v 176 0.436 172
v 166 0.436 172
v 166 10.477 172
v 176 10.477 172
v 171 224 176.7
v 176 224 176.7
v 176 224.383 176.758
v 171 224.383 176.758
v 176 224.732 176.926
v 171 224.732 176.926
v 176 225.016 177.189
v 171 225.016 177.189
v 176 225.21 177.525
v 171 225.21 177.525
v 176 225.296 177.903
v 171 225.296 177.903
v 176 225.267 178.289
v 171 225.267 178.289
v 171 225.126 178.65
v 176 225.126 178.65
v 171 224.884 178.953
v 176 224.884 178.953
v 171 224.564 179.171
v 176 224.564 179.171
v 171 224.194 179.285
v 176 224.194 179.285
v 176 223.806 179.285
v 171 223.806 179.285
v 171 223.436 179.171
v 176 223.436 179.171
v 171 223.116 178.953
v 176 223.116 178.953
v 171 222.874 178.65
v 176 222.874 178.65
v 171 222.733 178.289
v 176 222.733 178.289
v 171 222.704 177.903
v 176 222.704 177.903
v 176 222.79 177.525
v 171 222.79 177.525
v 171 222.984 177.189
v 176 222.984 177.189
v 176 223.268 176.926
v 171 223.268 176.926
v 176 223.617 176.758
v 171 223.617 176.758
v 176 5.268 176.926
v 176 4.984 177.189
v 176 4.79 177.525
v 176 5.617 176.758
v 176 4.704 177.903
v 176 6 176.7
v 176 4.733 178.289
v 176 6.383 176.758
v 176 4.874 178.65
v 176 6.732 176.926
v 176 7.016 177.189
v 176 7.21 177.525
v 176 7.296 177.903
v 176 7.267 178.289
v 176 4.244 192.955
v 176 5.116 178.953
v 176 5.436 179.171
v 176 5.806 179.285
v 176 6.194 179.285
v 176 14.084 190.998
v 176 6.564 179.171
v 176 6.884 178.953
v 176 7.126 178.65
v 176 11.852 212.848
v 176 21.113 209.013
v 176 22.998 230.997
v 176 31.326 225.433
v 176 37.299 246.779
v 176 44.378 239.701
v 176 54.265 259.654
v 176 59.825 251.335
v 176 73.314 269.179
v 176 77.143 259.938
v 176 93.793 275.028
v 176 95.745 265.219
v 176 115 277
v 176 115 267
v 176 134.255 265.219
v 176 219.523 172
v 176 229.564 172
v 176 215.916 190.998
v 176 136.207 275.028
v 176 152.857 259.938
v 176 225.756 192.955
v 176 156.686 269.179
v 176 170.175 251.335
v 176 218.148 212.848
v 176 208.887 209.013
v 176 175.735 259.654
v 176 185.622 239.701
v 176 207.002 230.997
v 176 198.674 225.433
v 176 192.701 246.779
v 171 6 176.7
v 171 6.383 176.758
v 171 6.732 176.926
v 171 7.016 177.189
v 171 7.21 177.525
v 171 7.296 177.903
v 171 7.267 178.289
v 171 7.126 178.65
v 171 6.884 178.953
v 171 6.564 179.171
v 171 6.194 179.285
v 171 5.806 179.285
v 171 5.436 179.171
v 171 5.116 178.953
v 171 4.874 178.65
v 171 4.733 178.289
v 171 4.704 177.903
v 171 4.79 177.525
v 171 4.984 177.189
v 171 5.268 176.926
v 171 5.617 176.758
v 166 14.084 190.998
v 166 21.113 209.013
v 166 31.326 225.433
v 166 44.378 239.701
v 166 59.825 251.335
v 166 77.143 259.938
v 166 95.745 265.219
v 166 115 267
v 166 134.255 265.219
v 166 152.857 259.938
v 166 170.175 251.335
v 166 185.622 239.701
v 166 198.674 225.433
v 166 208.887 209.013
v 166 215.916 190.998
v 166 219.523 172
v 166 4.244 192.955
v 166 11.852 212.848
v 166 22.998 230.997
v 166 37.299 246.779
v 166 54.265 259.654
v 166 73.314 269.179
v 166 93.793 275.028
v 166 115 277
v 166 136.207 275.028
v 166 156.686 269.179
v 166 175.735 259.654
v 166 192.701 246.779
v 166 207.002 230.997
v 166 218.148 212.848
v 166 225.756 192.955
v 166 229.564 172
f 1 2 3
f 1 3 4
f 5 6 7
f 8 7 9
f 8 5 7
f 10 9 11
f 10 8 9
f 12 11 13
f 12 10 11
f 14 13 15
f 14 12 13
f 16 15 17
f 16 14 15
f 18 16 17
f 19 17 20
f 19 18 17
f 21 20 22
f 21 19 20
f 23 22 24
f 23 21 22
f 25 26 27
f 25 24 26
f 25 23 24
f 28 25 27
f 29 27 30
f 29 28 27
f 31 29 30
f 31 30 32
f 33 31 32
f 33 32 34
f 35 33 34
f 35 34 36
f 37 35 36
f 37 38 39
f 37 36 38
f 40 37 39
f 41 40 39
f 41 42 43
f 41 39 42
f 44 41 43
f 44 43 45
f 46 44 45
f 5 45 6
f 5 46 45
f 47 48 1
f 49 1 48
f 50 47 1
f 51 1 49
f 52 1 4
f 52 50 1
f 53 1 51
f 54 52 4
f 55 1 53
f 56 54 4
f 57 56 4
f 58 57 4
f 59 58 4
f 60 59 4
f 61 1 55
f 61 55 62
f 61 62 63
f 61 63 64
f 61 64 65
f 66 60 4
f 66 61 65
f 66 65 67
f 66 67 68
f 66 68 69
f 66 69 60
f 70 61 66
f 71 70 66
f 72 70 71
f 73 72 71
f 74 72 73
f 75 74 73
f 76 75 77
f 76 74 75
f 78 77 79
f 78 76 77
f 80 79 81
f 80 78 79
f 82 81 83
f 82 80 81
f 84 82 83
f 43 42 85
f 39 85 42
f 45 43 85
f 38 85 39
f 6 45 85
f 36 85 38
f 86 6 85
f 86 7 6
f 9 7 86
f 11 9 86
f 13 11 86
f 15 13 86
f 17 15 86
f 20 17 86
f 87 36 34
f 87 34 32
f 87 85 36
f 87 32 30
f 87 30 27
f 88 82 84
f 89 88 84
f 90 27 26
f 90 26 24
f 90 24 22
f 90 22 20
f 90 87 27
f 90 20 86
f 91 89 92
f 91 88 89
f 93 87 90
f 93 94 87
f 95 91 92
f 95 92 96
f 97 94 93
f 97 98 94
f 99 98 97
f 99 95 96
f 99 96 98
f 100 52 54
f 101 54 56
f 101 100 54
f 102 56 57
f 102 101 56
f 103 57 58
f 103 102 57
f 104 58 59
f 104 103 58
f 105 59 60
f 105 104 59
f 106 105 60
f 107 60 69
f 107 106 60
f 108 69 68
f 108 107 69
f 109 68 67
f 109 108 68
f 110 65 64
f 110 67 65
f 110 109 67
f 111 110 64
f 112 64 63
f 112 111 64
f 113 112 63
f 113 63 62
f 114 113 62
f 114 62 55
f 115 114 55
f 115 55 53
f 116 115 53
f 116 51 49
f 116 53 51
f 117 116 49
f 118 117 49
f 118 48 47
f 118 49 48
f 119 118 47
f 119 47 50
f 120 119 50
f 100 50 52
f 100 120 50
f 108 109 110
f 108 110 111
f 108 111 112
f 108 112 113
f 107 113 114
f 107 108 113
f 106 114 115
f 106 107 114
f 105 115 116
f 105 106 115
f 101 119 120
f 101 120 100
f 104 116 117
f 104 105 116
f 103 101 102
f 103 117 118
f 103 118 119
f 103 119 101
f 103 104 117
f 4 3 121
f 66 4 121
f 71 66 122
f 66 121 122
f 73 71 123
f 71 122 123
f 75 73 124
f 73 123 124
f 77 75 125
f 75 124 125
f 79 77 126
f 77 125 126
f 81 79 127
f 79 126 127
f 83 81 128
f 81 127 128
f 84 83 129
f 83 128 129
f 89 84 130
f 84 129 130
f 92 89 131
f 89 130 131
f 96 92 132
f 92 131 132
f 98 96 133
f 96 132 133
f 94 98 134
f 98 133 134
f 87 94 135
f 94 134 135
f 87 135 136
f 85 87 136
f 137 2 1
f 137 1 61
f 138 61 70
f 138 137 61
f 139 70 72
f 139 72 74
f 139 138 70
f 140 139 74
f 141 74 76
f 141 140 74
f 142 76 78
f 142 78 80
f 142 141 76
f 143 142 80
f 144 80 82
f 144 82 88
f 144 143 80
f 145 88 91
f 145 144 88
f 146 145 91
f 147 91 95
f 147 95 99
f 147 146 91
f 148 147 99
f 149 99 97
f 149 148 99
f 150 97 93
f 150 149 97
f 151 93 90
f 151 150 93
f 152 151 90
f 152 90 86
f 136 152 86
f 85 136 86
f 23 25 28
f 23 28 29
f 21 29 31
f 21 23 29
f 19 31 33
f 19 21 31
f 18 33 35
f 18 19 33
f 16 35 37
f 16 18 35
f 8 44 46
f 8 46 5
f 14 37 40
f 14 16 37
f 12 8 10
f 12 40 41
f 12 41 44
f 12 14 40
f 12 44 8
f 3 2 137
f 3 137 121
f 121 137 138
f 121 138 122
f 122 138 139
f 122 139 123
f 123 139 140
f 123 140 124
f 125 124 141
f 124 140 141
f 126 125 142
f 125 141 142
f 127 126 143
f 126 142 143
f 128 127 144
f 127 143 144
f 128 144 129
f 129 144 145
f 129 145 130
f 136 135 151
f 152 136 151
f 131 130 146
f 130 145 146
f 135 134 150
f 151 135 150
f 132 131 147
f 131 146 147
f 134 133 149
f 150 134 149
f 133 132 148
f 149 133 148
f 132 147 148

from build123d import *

# Parameters (mm, degrees)
BOX105_W          = 202
BOX105_H          = 239
BOX105_DEPTH      = 10
CYLINDER080_R     = 1.3
CYLINDER080_DEPTH = 331
CYLINDER078_R     = 1.3
CYLINDER078_DEPTH = 331
CYLINDER079_W     = 105
CYLINDER079_H     = 10
CYLINDER079_ANGLE = 180
CYLINDER077_W     = 115
CYLINDER077_H     = 10
CYLINDER077_ANGLE = 180


with BuildPart() as cubo068:
    # Box105 → Box105 (new body)
    with BuildSketch(Plane.XY.offset(162)):
        with Locations((101, 119.5)):
            Rectangle(BOX105_W, BOX105_H)
    extrude(amount=BOX105_DEPTH)


with BuildPart() as cilindro080:
    # Cylinder080 → Cylinder080 (new body)
    with BuildSketch(Plane(origin=(5, 224, 178), x_dir=(0, 0, -1), z_dir=(1, 0, 0))):
        Circle(CYLINDER080_R)
    extrude(amount=CYLINDER080_DEPTH)


with BuildPart() as cilindro078:
    # Cylinder078 → Cylinder078 (new body)
    with BuildSketch(Plane(origin=(5, 6, 178), x_dir=(0, 0, -1), z_dir=(1, 0, 0))):
        Circle(CYLINDER078_R)
    extrude(amount=CYLINDER078_DEPTH)


with BuildPart() as cilindro079:
    # Cylinder079 → Cylinder079 (revolve)
    with BuildSketch(Plane(origin=(-3, 115, 171), x_dir=(0, -1, 0), z_dir=(0, 0, -1))):
        with Locations((52.5, 5)):
            Rectangle(CYLINDER079_W, CYLINDER079_H)
    revolve(axis=Axis((-3, 115, 171), (-1, 0, 0)), revolution_arc=CYLINDER079_ANGLE)


with BuildPart() as cut091:
    # Cylinder077 → Cylinder077 (revolve)
    with BuildSketch(Plane(origin=(-3, 115, 171), x_dir=(0, -1, 0), z_dir=(0, 0, -1))):
        with Locations((57.5, 5)):
            Rectangle(CYLINDER077_W, CYLINDER077_H)
    revolve(axis=Axis((-3, 115, 171), (-1, 0, 0)), revolution_arc=CYLINDER077_ANGLE)

    # Cut086: cut Cilindro079
    add(cilindro079.part, mode=Mode.SUBTRACT)


with BuildPart() as cut091_1:
    # Cut086 placement: moved
    add(cut091.part.moved(Location((13, 0, -9))))

    # Cut087: cut Cilindro078
    add(cilindro078.part, mode=Mode.SUBTRACT)

    # Cut085: cut Cilindro080
    add(cilindro080.part, mode=Mode.SUBTRACT)


with BuildPart() as cut091_2:
    # Cut085 placement: moved
    add(cut091_1.part.moved(Location((166, 0, 0))))

    # Cut091: cut Cubo068
    add(cubo068.part, mode=Mode.SUBTRACT)


solid = cut091_2.part
